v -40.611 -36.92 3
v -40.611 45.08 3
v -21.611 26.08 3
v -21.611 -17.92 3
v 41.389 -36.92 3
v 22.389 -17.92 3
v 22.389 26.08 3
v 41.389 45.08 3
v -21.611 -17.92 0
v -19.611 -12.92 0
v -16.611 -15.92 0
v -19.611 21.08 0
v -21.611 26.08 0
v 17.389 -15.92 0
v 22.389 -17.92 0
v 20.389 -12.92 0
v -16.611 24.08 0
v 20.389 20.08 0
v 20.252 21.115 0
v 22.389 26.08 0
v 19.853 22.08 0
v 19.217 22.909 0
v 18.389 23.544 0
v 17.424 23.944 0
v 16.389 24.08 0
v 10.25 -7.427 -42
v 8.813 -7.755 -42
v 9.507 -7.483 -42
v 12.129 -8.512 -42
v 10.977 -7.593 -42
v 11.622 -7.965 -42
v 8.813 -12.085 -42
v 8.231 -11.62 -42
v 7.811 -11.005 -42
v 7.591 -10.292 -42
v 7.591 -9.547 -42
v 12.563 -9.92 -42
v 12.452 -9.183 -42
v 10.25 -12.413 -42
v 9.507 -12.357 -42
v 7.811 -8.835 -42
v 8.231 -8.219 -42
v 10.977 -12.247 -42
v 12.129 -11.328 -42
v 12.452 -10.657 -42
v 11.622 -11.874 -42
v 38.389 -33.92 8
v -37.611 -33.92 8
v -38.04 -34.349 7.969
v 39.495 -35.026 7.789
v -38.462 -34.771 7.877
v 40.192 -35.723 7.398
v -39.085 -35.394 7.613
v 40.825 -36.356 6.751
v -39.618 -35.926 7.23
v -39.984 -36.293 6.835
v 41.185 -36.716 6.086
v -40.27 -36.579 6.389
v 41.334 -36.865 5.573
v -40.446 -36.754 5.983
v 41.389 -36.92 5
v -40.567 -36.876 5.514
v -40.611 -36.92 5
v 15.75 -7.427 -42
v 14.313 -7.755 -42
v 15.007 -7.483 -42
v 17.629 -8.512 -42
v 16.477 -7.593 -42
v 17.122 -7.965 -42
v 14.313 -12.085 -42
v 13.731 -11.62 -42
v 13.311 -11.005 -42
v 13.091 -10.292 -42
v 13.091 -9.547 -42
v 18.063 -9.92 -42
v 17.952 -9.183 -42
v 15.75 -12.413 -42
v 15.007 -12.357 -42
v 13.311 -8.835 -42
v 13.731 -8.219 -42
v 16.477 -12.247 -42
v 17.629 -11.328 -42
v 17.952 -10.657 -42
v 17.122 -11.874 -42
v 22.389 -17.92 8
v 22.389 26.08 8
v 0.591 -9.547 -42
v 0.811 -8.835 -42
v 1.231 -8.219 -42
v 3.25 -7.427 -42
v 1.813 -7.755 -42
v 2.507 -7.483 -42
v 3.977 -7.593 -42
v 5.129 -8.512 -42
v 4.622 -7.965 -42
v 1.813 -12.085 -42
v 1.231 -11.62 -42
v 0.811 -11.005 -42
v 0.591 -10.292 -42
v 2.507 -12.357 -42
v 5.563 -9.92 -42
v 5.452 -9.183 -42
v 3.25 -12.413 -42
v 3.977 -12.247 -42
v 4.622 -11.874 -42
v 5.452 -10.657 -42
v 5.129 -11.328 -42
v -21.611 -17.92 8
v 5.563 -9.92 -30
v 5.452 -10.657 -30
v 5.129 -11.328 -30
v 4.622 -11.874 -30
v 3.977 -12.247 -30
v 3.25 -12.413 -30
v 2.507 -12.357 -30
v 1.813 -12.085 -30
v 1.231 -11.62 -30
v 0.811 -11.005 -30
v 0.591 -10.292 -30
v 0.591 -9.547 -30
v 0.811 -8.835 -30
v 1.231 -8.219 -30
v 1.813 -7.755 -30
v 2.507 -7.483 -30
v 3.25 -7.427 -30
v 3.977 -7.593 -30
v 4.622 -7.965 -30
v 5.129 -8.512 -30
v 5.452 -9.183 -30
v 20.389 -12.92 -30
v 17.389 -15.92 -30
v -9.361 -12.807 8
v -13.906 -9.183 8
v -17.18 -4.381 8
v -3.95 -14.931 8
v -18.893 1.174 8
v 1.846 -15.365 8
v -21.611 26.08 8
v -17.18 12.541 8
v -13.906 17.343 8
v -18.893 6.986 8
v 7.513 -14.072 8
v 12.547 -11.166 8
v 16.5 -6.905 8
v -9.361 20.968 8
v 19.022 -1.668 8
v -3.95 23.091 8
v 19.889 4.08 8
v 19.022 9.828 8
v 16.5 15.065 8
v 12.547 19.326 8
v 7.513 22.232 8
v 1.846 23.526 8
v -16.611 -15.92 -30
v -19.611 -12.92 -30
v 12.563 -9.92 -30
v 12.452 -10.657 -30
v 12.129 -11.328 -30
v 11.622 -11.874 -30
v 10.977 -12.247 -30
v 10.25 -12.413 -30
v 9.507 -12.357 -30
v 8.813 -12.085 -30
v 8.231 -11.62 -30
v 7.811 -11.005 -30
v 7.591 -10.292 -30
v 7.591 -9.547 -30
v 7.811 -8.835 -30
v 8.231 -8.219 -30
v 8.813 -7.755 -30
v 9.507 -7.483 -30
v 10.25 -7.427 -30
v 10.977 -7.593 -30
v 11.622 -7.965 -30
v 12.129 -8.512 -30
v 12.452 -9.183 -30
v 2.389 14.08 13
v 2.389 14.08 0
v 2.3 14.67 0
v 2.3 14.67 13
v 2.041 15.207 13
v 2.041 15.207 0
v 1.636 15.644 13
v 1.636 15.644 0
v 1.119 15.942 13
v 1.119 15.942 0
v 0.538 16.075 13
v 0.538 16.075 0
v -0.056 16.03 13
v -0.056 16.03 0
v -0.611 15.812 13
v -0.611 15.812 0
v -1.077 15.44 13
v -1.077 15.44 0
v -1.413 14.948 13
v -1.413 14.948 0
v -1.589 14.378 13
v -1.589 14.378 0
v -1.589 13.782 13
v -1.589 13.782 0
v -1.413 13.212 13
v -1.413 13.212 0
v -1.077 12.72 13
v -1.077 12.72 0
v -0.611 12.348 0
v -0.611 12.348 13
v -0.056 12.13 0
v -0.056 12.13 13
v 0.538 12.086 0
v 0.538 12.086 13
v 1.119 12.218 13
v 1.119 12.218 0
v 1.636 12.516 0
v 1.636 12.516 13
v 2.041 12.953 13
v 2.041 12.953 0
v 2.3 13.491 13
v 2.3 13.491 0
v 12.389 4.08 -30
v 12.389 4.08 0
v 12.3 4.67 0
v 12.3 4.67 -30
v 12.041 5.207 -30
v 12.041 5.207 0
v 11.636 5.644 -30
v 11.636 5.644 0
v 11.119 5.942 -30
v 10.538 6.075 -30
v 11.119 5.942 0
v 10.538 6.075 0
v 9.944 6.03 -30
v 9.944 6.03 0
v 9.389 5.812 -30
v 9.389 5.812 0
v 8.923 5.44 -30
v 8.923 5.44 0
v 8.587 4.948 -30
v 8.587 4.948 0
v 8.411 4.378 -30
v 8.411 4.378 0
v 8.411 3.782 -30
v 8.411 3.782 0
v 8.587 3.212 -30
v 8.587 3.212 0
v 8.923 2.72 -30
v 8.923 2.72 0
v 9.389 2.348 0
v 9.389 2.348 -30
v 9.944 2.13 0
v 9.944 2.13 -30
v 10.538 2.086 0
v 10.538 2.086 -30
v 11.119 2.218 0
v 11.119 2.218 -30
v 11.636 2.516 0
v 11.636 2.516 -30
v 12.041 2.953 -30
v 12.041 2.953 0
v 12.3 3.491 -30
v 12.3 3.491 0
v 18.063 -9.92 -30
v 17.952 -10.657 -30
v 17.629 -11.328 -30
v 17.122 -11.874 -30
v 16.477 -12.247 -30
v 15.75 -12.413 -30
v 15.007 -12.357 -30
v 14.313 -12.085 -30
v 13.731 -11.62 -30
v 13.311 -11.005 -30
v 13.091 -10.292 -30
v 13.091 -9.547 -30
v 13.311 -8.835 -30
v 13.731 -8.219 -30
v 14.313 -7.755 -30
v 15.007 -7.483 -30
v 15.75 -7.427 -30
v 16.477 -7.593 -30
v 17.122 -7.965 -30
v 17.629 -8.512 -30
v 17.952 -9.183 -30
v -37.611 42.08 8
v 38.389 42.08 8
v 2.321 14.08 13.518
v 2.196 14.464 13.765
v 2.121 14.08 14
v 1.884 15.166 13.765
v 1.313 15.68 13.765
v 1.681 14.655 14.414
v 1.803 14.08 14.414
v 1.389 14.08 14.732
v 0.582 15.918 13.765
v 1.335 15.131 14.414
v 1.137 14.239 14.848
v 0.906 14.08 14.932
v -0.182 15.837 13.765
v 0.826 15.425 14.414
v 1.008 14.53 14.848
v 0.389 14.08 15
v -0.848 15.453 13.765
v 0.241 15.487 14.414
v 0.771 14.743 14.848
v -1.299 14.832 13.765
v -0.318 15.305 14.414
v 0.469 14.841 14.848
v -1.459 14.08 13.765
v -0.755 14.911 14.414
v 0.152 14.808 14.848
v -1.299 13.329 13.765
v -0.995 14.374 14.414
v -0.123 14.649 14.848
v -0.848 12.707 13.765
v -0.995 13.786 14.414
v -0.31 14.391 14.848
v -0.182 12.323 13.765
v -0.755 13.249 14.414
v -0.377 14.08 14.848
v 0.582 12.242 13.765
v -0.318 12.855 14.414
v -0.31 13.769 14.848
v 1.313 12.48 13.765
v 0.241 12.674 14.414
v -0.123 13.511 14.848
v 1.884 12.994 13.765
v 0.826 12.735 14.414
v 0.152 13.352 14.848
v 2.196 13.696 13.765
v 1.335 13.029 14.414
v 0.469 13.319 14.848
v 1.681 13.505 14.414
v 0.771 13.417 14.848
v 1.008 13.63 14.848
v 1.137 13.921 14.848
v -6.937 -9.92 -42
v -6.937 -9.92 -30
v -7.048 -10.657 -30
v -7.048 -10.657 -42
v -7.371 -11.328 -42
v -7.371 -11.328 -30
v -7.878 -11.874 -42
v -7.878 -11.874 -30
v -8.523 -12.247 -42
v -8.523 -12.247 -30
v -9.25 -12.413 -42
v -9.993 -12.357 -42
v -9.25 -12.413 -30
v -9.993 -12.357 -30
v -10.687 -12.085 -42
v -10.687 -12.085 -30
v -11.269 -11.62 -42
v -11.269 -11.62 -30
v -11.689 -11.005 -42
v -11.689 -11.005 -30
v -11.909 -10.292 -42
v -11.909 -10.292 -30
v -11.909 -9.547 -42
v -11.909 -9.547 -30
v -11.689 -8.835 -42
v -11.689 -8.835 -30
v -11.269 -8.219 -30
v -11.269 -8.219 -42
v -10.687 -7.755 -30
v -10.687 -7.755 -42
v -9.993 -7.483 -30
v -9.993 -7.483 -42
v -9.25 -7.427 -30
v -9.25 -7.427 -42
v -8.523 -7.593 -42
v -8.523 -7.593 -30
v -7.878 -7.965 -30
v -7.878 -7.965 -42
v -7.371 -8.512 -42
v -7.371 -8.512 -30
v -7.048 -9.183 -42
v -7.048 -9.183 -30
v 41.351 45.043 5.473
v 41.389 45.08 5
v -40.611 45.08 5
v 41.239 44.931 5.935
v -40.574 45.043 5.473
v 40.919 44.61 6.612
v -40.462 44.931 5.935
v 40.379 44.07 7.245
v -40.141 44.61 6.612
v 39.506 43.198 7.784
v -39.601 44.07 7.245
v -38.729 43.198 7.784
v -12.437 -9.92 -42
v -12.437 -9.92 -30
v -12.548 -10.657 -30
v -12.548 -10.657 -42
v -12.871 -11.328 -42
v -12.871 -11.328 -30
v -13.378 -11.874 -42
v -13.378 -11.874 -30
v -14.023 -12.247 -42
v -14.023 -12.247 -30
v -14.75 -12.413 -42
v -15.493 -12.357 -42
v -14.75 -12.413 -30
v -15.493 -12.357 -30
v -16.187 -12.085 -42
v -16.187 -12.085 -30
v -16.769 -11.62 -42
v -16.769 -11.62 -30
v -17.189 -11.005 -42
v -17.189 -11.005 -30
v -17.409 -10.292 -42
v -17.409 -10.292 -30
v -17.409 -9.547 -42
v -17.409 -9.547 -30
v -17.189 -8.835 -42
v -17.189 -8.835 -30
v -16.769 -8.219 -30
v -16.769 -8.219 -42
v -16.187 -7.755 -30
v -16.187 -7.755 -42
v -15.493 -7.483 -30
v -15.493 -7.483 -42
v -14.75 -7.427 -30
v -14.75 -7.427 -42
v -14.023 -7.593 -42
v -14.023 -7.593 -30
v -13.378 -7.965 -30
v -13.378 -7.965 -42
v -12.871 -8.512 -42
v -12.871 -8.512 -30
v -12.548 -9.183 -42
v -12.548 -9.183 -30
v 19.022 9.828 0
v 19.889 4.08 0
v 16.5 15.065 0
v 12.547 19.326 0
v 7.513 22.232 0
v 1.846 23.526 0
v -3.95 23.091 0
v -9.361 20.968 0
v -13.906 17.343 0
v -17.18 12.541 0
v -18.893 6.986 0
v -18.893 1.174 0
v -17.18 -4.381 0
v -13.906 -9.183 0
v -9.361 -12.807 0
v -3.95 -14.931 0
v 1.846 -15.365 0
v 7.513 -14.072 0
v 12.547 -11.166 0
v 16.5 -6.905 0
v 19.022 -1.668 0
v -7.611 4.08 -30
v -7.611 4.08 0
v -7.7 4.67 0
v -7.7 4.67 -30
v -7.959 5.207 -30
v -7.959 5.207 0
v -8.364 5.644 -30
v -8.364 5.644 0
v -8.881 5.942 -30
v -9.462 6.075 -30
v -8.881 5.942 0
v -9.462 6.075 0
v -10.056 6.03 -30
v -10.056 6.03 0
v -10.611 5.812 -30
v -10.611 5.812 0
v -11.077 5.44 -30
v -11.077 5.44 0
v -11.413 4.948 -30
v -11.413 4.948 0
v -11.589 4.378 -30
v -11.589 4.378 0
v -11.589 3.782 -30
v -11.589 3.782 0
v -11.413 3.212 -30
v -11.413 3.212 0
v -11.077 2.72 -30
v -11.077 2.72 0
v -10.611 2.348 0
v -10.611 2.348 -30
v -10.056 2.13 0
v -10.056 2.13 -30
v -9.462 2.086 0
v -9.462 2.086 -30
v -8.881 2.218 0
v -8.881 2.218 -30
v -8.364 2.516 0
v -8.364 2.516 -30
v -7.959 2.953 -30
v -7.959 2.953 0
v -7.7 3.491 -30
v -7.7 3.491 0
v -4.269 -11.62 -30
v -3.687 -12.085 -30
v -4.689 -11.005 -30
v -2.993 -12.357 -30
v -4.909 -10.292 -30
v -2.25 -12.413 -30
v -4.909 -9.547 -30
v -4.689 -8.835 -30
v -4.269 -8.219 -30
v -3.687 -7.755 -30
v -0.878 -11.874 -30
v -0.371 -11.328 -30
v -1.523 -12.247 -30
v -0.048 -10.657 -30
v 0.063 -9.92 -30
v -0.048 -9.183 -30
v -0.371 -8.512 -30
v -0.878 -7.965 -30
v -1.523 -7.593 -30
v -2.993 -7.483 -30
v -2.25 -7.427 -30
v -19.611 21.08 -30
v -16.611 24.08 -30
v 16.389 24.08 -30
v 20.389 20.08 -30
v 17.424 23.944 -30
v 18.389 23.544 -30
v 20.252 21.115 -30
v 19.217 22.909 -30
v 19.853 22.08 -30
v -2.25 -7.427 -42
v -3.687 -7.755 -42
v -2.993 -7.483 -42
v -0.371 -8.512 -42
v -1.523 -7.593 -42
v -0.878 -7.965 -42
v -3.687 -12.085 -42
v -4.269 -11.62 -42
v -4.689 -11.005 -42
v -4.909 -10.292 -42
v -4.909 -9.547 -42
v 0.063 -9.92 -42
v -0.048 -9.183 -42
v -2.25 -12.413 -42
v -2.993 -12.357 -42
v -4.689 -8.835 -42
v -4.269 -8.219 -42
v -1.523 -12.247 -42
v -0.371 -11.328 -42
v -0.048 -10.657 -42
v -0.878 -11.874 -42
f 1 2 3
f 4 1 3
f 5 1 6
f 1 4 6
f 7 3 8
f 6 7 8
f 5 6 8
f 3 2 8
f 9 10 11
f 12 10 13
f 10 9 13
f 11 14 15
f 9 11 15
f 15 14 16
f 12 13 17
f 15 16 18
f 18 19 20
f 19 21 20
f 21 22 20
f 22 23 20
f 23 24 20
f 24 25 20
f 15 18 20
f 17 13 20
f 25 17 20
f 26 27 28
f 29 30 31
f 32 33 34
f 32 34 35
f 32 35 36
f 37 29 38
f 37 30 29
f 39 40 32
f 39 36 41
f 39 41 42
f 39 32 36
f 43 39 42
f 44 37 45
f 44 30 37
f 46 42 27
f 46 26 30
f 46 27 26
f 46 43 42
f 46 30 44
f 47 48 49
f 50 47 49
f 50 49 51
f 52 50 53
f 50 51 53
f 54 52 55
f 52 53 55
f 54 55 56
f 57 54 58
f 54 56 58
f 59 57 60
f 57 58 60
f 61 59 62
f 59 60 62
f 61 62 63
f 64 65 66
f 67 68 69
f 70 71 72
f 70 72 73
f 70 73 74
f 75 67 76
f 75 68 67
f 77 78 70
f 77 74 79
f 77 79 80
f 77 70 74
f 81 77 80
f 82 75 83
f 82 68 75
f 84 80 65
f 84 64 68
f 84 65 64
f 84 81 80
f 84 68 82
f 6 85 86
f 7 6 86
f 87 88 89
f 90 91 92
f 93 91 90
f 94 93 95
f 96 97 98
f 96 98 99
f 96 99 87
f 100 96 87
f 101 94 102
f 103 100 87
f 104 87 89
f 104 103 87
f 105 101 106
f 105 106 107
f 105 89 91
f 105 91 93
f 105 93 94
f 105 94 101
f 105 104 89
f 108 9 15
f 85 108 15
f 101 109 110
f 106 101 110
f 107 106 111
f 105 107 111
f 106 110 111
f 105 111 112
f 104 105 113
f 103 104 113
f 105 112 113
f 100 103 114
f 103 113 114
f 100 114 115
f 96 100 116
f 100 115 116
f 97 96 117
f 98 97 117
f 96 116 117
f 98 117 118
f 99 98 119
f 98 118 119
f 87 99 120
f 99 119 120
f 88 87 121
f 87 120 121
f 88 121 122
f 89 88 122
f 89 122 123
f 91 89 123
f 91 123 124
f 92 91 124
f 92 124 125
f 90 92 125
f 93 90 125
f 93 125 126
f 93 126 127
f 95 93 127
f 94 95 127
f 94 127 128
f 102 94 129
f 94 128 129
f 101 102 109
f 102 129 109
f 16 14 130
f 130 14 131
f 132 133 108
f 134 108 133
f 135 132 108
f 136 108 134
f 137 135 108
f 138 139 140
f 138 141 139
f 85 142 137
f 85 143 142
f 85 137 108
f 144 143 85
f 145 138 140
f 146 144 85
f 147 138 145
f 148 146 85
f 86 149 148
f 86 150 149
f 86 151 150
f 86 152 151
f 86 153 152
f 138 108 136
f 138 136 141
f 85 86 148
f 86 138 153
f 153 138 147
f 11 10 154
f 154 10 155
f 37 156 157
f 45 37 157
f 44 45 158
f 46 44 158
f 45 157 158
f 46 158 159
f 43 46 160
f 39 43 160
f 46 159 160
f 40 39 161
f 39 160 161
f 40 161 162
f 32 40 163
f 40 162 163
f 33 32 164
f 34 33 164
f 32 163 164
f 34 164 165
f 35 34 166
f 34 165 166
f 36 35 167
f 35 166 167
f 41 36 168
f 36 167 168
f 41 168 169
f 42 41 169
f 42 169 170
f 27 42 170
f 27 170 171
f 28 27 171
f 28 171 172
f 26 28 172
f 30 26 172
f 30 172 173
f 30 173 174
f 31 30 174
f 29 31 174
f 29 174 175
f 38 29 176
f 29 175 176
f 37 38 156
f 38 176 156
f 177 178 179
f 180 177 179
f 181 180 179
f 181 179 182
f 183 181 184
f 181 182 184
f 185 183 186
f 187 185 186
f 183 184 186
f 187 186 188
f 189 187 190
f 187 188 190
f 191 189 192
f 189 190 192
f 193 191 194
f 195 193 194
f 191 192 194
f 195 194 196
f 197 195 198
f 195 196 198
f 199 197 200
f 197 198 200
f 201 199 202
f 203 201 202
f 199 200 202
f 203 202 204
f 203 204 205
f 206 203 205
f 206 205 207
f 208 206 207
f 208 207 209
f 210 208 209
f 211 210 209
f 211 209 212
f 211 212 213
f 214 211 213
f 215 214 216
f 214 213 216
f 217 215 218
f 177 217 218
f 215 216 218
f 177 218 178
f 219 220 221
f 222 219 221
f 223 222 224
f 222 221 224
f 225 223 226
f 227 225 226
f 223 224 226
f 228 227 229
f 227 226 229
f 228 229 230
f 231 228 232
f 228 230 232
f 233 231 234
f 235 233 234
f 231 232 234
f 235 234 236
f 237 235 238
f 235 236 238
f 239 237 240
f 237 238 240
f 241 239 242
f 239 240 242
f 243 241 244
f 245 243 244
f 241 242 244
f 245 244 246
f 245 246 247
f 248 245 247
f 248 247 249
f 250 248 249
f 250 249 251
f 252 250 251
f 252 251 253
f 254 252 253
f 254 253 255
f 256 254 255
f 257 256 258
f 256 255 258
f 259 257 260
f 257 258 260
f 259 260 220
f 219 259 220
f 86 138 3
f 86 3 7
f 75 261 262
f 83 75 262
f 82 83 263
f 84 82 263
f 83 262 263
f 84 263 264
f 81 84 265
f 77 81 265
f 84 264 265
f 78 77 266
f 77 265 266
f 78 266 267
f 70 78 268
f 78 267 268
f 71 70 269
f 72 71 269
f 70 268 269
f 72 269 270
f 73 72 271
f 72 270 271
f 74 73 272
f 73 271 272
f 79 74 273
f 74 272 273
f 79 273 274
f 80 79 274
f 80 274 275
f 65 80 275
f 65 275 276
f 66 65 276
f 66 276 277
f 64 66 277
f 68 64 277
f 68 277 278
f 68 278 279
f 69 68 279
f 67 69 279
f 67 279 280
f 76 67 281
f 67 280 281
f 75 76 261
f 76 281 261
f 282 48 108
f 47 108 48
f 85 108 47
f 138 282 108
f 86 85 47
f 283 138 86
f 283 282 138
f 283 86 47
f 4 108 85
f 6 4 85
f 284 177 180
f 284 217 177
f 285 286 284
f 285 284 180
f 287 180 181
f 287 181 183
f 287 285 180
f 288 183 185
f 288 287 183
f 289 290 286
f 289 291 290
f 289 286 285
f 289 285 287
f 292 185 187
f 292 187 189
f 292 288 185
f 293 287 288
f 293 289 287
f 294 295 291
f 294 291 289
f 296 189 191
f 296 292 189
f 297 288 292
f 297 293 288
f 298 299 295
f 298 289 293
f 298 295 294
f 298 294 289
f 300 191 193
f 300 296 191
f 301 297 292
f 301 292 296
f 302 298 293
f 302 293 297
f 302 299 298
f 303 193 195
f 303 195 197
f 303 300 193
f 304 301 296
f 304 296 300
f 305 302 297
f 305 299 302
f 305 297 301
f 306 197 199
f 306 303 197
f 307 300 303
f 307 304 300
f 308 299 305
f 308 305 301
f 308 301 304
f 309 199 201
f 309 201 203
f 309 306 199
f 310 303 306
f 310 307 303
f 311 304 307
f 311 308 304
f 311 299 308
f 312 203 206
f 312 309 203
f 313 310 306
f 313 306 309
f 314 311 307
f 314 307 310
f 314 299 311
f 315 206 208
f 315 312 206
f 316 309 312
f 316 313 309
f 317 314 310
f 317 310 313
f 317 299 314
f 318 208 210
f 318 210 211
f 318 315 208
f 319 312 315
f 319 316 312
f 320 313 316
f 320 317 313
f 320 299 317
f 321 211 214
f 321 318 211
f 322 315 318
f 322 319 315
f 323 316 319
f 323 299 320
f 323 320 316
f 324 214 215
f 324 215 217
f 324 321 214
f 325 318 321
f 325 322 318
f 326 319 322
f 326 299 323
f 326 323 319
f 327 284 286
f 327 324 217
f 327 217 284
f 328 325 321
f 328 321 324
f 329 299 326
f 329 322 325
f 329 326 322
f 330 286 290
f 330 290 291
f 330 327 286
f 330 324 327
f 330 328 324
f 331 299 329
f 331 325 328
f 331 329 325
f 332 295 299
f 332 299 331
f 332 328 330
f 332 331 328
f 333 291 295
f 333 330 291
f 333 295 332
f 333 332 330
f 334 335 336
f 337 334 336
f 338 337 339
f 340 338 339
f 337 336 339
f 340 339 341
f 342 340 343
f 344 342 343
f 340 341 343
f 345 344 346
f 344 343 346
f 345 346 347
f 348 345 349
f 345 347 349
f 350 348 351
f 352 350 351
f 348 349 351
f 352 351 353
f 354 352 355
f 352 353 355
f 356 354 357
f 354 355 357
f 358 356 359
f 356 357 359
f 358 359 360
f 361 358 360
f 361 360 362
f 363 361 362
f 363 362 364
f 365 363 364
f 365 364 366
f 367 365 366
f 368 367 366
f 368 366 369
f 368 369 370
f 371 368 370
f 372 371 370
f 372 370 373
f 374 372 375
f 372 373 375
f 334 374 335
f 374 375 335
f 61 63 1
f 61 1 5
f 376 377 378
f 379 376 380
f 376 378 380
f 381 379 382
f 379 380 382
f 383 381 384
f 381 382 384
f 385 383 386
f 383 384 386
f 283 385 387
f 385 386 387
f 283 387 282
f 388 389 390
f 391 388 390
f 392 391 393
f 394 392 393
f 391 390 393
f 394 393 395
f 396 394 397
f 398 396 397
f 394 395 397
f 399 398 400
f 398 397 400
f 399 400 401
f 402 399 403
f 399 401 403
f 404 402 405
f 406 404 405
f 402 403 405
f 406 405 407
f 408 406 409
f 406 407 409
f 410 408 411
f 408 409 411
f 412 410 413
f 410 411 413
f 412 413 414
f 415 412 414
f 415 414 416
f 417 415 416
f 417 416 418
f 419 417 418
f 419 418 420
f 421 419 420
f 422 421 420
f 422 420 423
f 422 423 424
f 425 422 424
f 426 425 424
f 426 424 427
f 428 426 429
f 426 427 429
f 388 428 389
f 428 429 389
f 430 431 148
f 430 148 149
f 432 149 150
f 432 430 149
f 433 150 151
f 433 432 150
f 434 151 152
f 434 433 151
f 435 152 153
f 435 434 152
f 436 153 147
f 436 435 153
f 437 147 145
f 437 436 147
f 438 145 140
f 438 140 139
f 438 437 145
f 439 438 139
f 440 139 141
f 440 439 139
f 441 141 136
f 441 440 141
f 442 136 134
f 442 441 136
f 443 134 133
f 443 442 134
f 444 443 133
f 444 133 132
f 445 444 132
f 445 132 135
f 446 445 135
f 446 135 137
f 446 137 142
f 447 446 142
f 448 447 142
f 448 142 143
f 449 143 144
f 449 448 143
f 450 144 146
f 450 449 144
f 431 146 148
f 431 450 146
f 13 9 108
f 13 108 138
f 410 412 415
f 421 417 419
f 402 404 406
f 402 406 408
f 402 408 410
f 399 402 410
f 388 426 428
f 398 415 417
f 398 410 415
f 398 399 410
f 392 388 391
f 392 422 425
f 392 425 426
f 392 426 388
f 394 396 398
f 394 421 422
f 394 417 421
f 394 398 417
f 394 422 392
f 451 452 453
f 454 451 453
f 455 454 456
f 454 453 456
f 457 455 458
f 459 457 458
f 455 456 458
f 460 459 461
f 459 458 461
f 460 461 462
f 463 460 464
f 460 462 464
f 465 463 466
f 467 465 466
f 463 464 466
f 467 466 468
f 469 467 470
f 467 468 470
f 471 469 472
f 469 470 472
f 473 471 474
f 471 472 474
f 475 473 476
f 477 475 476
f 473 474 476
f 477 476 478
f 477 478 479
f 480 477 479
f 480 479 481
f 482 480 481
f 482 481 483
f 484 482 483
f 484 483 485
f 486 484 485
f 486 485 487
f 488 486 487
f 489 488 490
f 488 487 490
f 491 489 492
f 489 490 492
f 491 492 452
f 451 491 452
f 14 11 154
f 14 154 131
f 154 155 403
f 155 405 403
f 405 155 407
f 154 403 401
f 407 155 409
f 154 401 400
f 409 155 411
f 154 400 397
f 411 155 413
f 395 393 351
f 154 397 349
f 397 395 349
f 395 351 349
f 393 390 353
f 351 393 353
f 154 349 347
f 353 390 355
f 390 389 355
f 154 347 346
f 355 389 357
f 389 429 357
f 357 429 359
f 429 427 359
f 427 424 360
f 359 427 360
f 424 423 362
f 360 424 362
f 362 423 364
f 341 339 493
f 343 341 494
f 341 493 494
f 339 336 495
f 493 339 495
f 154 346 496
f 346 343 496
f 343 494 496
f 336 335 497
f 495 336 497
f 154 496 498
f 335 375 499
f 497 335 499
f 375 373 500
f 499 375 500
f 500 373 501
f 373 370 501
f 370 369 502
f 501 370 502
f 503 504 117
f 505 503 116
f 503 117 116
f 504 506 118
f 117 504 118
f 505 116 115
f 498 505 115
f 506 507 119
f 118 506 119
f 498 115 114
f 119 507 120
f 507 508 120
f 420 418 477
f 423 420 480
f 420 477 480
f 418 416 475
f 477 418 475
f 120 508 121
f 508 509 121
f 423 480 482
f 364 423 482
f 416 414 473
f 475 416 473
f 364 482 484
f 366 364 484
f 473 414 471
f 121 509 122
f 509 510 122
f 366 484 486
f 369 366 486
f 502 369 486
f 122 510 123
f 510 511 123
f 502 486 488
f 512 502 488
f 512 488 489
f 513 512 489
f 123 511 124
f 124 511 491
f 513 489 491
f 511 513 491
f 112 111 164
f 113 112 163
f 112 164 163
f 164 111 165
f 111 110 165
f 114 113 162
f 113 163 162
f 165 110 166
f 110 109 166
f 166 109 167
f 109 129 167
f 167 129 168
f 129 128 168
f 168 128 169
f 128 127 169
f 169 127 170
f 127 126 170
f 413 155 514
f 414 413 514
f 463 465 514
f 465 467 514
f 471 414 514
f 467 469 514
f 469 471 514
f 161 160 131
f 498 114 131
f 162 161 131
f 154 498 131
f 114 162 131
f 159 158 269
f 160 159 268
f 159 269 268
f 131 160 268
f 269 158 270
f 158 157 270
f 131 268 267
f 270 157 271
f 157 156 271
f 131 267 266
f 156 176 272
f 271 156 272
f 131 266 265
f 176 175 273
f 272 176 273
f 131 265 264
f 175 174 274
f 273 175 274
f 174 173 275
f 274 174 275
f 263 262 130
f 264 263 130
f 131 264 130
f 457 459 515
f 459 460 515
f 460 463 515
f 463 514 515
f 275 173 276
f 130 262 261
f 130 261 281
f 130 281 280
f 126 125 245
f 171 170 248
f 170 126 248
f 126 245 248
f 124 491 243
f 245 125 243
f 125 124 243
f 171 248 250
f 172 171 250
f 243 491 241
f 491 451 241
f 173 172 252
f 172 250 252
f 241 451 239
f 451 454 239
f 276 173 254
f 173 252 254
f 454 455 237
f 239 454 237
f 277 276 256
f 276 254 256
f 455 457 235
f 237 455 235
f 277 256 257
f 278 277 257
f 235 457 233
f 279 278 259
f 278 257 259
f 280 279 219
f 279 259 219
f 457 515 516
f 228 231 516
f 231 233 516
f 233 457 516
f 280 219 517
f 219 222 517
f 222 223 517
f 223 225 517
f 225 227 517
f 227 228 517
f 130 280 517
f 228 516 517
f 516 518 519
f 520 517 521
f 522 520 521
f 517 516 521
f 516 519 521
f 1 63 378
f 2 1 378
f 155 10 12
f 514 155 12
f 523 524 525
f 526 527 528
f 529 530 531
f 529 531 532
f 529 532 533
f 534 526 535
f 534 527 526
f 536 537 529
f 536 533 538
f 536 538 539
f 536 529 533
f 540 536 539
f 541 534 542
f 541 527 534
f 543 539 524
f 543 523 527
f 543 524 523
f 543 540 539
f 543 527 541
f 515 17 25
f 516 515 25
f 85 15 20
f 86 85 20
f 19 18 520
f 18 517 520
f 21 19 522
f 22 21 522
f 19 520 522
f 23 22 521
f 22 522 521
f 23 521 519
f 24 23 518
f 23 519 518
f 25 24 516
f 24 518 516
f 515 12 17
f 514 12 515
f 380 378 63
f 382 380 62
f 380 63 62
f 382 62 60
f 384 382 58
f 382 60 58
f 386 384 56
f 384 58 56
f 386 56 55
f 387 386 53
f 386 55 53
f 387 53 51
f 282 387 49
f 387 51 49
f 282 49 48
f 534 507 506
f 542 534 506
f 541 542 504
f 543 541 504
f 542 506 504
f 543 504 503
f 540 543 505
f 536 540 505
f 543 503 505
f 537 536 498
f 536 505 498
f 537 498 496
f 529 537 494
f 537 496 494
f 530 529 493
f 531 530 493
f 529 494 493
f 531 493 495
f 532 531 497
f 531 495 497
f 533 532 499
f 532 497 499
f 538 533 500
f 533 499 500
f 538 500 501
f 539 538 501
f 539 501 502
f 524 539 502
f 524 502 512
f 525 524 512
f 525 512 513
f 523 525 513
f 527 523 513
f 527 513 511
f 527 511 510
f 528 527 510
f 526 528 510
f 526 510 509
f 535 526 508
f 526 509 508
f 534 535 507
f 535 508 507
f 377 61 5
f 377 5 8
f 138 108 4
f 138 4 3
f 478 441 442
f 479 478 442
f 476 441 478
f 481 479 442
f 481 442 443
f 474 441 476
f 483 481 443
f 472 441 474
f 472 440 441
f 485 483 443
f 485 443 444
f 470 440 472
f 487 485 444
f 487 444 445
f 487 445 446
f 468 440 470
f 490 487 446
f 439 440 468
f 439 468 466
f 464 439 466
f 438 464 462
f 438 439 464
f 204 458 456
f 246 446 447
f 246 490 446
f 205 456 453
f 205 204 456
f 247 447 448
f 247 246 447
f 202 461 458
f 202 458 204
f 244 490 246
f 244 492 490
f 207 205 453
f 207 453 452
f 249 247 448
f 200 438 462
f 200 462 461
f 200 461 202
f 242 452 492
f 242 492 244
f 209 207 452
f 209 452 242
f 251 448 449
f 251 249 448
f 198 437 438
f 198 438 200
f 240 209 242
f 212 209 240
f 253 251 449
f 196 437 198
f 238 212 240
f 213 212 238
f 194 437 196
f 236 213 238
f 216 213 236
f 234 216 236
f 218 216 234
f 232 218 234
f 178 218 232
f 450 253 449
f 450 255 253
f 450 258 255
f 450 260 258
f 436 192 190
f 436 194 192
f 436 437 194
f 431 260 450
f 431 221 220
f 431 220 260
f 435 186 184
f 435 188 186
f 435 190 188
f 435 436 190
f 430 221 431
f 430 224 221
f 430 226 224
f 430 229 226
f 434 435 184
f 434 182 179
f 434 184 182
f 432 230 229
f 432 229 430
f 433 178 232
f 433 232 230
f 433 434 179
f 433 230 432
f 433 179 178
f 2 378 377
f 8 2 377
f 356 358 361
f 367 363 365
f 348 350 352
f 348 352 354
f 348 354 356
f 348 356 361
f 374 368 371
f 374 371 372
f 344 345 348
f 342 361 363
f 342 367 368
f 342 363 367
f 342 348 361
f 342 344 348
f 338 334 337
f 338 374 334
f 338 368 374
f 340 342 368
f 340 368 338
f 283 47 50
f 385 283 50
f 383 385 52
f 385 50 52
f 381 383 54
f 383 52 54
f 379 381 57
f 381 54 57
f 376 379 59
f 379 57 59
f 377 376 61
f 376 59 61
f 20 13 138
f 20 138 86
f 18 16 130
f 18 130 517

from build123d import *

# Parameters (mm, degrees)
F0_W      = 44
F0_H      = 44
F0_W_2    = 40
F0_H_2    = 40
F0_R      = 19.5
F1_DEPTH  = 8
F0_R_2    = 2
F2_DEPTH  = 30
F3_DEPTH  = 15
F4_R      = 2
F5_W      = 82
F5_H      = 82
F5_W_2    = 44
F5_H_2    = 44
F6_DEPTH  = 5
F9_DEPTH  = 82.001
F10_DEPTH = 82.001
F11_R     = 4
F12_SIZE  = 3
F13_R     = 2.5
F14_DEPTH = 12


with BuildPart() as f1:
    # F0 (on Top) → F1 (new body)
    with BuildSketch(Plane.XY):
        with Locations((0.3887694329, 4.0801210612)):
            Rectangle(F0_W, F0_H)
        with Locations((0.3887694329, 4.0801210612)):
            Rectangle(F0_W_2, F0_H_2, mode=Mode.SUBTRACT)
        with Locations((0.3887694329, 4.0801210612)):
            Rectangle(F0_W_2, F0_H_2)
        with Locations((0.3887694329, 4.0801210612)):
            Circle(F0_R, mode=Mode.SUBTRACT)
    extrude(amount=F1_DEPTH)

    # F0 (on Top) → F2 (join)
    with BuildSketch(Plane.XY):
        with Locations((0.3887694329, 4.0801210612)):
            Rectangle(F0_W_2, F0_H_2)
        with Locations((0.3887694329, 4.0801210612)):
            Circle(F0_R, mode=Mode.SUBTRACT)
        with Locations((0.3887694329, 4.0801210612)):
            Circle(F0_R)
        with Locations((-9.6112305671, 4.0801210612)):
            Circle(F0_R_2, mode=Mode.SUBTRACT)
        with Locations((10.3887694329, 4.0801210612)):
            Circle(F0_R_2, mode=Mode.SUBTRACT)
        with Locations((0.3887694329, 14.0801210612)):
            Circle(F0_R_2, mode=Mode.SUBTRACT)
        with Locations((0.3887694329, 14.0801210612)):
            Circle(F0_R_2)
    extrude(amount=-F2_DEPTH)

    # F0 (on Top) → F3 (join)
    with BuildSketch(Plane.XY):
        with Locations((0.3887694329, 14.0801210612)):
            Circle(F0_R_2)
    extrude(amount=F3_DEPTH)

    # F4
    f4_edges = [f1.edges().sort_by_distance(p)[0] for p in [
        (-1.611231, 14.080121, 15),
    ]]
    fillet(f4_edges, radius=F4_R)

    # F11
    f11_edges = [f1.edges().sort_by_distance(p)[0] for p in [
        (20.388769, 24.080121, -15),
    ]]
    fillet(f11_edges, radius=F11_R)

    # F12
    f12_edges = [f1.edges().sort_by_distance(p)[0] for p in [
        (16.388769, 24.080121, -15),
        (-19.611231, 24.080121, -15),
        (-19.611231, -15.919879, -15),
        (20.388769, -15.919879, -15),
    ]]
    chamfer(f12_edges, length=F12_SIZE)

    # F13 (on face) → F14 (join)
    with BuildSketch(Plane(origin=(0, 0, -30), x_dir=(1, 0, 0), z_dir=(0, 0, -1))):
        with Locations((10.0634490028, 9.9198789388)):
            Circle(F13_R)
        with Locations((3.0634490028, 9.9198789388)):
            Circle(F13_R)
        with Locations((15.5634490028, 9.9198789388)):
            Circle(F13_R)
        with Locations((-2.4365509972, 9.9198789388)):
            Circle(F13_R)
        with Locations((-9.4365509972, 9.9198789388)):
            Circle(F13_R)
        with Locations((-14.9365509972, 9.9198789388)):
            Circle(F13_R)
    extrude(amount=F14_DEPTH)


with BuildPart() as f6:
    # F5 (on face) → F6 (new body)
    with BuildSketch(Plane.XY.offset(8)):
        with Locations((0.3887694329, 4.0801210612)):
            Rectangle(F5_W, F5_H)
        with Locations((0.3887694329, 4.0801210612)):
            Rectangle(F5_W_2, F5_H_2, mode=Mode.SUBTRACT)
    extrude(amount=-F6_DEPTH)

    # F7 (on face) → F9 (cut, through all)
    with BuildSketch(Plane(origin=(-40.6112305671, 0, 0), x_dir=(0, -1, 0), z_dir=(-1, 0, 0))):
        with BuildLine():
            ThreePointArc((-45.0801210612, 5), (-44.2014414048, 7.1213203436), (-42.0801210612, 8))
            Line((-42.0801210612, 8), (-45.0801210612, 8))
            Line((-45.0801210612, 8), (-45.0801210612, 5))
        make_face()
        with BuildLine():
            ThreePointArc((33.9198789388, 8), (36.0411992823, 7.1213203436), (36.9198789388, 5))
            Line((36.9198789388, 5), (36.9198789388, 8))
            Line((36.9198789388, 8), (33.9198789388, 8))
        make_face()
    extrude(amount=-F9_DEPTH, mode=Mode.SUBTRACT)

    # F8 (on face) → F10 (cut, through all)
    with BuildSketch(Plane.XZ.offset(36.9198789388)):
        with BuildLine():
            Line((41.3887694329, 8), (38.3887694329, 8))
            ThreePointArc((38.3887694329, 8), (40.5100897765, 7.1213203436), (41.3887694329, 5))
            Line((41.3887694329, 5), (41.3887694329, 8))
        make_face()
        with BuildLine():
            ThreePointArc((-40.6112305671, 5), (-39.7325509107, 7.1213203436), (-37.6112305671, 8))
            Line((-37.6112305671, 8), (-40.6112305671, 8))
            Line((-40.6112305671, 8), (-40.6112305671, 5))
        make_face()
    extrude(amount=-F10_DEPTH, mode=Mode.SUBTRACT)


solid = Compound([f1.part, f6.part])
